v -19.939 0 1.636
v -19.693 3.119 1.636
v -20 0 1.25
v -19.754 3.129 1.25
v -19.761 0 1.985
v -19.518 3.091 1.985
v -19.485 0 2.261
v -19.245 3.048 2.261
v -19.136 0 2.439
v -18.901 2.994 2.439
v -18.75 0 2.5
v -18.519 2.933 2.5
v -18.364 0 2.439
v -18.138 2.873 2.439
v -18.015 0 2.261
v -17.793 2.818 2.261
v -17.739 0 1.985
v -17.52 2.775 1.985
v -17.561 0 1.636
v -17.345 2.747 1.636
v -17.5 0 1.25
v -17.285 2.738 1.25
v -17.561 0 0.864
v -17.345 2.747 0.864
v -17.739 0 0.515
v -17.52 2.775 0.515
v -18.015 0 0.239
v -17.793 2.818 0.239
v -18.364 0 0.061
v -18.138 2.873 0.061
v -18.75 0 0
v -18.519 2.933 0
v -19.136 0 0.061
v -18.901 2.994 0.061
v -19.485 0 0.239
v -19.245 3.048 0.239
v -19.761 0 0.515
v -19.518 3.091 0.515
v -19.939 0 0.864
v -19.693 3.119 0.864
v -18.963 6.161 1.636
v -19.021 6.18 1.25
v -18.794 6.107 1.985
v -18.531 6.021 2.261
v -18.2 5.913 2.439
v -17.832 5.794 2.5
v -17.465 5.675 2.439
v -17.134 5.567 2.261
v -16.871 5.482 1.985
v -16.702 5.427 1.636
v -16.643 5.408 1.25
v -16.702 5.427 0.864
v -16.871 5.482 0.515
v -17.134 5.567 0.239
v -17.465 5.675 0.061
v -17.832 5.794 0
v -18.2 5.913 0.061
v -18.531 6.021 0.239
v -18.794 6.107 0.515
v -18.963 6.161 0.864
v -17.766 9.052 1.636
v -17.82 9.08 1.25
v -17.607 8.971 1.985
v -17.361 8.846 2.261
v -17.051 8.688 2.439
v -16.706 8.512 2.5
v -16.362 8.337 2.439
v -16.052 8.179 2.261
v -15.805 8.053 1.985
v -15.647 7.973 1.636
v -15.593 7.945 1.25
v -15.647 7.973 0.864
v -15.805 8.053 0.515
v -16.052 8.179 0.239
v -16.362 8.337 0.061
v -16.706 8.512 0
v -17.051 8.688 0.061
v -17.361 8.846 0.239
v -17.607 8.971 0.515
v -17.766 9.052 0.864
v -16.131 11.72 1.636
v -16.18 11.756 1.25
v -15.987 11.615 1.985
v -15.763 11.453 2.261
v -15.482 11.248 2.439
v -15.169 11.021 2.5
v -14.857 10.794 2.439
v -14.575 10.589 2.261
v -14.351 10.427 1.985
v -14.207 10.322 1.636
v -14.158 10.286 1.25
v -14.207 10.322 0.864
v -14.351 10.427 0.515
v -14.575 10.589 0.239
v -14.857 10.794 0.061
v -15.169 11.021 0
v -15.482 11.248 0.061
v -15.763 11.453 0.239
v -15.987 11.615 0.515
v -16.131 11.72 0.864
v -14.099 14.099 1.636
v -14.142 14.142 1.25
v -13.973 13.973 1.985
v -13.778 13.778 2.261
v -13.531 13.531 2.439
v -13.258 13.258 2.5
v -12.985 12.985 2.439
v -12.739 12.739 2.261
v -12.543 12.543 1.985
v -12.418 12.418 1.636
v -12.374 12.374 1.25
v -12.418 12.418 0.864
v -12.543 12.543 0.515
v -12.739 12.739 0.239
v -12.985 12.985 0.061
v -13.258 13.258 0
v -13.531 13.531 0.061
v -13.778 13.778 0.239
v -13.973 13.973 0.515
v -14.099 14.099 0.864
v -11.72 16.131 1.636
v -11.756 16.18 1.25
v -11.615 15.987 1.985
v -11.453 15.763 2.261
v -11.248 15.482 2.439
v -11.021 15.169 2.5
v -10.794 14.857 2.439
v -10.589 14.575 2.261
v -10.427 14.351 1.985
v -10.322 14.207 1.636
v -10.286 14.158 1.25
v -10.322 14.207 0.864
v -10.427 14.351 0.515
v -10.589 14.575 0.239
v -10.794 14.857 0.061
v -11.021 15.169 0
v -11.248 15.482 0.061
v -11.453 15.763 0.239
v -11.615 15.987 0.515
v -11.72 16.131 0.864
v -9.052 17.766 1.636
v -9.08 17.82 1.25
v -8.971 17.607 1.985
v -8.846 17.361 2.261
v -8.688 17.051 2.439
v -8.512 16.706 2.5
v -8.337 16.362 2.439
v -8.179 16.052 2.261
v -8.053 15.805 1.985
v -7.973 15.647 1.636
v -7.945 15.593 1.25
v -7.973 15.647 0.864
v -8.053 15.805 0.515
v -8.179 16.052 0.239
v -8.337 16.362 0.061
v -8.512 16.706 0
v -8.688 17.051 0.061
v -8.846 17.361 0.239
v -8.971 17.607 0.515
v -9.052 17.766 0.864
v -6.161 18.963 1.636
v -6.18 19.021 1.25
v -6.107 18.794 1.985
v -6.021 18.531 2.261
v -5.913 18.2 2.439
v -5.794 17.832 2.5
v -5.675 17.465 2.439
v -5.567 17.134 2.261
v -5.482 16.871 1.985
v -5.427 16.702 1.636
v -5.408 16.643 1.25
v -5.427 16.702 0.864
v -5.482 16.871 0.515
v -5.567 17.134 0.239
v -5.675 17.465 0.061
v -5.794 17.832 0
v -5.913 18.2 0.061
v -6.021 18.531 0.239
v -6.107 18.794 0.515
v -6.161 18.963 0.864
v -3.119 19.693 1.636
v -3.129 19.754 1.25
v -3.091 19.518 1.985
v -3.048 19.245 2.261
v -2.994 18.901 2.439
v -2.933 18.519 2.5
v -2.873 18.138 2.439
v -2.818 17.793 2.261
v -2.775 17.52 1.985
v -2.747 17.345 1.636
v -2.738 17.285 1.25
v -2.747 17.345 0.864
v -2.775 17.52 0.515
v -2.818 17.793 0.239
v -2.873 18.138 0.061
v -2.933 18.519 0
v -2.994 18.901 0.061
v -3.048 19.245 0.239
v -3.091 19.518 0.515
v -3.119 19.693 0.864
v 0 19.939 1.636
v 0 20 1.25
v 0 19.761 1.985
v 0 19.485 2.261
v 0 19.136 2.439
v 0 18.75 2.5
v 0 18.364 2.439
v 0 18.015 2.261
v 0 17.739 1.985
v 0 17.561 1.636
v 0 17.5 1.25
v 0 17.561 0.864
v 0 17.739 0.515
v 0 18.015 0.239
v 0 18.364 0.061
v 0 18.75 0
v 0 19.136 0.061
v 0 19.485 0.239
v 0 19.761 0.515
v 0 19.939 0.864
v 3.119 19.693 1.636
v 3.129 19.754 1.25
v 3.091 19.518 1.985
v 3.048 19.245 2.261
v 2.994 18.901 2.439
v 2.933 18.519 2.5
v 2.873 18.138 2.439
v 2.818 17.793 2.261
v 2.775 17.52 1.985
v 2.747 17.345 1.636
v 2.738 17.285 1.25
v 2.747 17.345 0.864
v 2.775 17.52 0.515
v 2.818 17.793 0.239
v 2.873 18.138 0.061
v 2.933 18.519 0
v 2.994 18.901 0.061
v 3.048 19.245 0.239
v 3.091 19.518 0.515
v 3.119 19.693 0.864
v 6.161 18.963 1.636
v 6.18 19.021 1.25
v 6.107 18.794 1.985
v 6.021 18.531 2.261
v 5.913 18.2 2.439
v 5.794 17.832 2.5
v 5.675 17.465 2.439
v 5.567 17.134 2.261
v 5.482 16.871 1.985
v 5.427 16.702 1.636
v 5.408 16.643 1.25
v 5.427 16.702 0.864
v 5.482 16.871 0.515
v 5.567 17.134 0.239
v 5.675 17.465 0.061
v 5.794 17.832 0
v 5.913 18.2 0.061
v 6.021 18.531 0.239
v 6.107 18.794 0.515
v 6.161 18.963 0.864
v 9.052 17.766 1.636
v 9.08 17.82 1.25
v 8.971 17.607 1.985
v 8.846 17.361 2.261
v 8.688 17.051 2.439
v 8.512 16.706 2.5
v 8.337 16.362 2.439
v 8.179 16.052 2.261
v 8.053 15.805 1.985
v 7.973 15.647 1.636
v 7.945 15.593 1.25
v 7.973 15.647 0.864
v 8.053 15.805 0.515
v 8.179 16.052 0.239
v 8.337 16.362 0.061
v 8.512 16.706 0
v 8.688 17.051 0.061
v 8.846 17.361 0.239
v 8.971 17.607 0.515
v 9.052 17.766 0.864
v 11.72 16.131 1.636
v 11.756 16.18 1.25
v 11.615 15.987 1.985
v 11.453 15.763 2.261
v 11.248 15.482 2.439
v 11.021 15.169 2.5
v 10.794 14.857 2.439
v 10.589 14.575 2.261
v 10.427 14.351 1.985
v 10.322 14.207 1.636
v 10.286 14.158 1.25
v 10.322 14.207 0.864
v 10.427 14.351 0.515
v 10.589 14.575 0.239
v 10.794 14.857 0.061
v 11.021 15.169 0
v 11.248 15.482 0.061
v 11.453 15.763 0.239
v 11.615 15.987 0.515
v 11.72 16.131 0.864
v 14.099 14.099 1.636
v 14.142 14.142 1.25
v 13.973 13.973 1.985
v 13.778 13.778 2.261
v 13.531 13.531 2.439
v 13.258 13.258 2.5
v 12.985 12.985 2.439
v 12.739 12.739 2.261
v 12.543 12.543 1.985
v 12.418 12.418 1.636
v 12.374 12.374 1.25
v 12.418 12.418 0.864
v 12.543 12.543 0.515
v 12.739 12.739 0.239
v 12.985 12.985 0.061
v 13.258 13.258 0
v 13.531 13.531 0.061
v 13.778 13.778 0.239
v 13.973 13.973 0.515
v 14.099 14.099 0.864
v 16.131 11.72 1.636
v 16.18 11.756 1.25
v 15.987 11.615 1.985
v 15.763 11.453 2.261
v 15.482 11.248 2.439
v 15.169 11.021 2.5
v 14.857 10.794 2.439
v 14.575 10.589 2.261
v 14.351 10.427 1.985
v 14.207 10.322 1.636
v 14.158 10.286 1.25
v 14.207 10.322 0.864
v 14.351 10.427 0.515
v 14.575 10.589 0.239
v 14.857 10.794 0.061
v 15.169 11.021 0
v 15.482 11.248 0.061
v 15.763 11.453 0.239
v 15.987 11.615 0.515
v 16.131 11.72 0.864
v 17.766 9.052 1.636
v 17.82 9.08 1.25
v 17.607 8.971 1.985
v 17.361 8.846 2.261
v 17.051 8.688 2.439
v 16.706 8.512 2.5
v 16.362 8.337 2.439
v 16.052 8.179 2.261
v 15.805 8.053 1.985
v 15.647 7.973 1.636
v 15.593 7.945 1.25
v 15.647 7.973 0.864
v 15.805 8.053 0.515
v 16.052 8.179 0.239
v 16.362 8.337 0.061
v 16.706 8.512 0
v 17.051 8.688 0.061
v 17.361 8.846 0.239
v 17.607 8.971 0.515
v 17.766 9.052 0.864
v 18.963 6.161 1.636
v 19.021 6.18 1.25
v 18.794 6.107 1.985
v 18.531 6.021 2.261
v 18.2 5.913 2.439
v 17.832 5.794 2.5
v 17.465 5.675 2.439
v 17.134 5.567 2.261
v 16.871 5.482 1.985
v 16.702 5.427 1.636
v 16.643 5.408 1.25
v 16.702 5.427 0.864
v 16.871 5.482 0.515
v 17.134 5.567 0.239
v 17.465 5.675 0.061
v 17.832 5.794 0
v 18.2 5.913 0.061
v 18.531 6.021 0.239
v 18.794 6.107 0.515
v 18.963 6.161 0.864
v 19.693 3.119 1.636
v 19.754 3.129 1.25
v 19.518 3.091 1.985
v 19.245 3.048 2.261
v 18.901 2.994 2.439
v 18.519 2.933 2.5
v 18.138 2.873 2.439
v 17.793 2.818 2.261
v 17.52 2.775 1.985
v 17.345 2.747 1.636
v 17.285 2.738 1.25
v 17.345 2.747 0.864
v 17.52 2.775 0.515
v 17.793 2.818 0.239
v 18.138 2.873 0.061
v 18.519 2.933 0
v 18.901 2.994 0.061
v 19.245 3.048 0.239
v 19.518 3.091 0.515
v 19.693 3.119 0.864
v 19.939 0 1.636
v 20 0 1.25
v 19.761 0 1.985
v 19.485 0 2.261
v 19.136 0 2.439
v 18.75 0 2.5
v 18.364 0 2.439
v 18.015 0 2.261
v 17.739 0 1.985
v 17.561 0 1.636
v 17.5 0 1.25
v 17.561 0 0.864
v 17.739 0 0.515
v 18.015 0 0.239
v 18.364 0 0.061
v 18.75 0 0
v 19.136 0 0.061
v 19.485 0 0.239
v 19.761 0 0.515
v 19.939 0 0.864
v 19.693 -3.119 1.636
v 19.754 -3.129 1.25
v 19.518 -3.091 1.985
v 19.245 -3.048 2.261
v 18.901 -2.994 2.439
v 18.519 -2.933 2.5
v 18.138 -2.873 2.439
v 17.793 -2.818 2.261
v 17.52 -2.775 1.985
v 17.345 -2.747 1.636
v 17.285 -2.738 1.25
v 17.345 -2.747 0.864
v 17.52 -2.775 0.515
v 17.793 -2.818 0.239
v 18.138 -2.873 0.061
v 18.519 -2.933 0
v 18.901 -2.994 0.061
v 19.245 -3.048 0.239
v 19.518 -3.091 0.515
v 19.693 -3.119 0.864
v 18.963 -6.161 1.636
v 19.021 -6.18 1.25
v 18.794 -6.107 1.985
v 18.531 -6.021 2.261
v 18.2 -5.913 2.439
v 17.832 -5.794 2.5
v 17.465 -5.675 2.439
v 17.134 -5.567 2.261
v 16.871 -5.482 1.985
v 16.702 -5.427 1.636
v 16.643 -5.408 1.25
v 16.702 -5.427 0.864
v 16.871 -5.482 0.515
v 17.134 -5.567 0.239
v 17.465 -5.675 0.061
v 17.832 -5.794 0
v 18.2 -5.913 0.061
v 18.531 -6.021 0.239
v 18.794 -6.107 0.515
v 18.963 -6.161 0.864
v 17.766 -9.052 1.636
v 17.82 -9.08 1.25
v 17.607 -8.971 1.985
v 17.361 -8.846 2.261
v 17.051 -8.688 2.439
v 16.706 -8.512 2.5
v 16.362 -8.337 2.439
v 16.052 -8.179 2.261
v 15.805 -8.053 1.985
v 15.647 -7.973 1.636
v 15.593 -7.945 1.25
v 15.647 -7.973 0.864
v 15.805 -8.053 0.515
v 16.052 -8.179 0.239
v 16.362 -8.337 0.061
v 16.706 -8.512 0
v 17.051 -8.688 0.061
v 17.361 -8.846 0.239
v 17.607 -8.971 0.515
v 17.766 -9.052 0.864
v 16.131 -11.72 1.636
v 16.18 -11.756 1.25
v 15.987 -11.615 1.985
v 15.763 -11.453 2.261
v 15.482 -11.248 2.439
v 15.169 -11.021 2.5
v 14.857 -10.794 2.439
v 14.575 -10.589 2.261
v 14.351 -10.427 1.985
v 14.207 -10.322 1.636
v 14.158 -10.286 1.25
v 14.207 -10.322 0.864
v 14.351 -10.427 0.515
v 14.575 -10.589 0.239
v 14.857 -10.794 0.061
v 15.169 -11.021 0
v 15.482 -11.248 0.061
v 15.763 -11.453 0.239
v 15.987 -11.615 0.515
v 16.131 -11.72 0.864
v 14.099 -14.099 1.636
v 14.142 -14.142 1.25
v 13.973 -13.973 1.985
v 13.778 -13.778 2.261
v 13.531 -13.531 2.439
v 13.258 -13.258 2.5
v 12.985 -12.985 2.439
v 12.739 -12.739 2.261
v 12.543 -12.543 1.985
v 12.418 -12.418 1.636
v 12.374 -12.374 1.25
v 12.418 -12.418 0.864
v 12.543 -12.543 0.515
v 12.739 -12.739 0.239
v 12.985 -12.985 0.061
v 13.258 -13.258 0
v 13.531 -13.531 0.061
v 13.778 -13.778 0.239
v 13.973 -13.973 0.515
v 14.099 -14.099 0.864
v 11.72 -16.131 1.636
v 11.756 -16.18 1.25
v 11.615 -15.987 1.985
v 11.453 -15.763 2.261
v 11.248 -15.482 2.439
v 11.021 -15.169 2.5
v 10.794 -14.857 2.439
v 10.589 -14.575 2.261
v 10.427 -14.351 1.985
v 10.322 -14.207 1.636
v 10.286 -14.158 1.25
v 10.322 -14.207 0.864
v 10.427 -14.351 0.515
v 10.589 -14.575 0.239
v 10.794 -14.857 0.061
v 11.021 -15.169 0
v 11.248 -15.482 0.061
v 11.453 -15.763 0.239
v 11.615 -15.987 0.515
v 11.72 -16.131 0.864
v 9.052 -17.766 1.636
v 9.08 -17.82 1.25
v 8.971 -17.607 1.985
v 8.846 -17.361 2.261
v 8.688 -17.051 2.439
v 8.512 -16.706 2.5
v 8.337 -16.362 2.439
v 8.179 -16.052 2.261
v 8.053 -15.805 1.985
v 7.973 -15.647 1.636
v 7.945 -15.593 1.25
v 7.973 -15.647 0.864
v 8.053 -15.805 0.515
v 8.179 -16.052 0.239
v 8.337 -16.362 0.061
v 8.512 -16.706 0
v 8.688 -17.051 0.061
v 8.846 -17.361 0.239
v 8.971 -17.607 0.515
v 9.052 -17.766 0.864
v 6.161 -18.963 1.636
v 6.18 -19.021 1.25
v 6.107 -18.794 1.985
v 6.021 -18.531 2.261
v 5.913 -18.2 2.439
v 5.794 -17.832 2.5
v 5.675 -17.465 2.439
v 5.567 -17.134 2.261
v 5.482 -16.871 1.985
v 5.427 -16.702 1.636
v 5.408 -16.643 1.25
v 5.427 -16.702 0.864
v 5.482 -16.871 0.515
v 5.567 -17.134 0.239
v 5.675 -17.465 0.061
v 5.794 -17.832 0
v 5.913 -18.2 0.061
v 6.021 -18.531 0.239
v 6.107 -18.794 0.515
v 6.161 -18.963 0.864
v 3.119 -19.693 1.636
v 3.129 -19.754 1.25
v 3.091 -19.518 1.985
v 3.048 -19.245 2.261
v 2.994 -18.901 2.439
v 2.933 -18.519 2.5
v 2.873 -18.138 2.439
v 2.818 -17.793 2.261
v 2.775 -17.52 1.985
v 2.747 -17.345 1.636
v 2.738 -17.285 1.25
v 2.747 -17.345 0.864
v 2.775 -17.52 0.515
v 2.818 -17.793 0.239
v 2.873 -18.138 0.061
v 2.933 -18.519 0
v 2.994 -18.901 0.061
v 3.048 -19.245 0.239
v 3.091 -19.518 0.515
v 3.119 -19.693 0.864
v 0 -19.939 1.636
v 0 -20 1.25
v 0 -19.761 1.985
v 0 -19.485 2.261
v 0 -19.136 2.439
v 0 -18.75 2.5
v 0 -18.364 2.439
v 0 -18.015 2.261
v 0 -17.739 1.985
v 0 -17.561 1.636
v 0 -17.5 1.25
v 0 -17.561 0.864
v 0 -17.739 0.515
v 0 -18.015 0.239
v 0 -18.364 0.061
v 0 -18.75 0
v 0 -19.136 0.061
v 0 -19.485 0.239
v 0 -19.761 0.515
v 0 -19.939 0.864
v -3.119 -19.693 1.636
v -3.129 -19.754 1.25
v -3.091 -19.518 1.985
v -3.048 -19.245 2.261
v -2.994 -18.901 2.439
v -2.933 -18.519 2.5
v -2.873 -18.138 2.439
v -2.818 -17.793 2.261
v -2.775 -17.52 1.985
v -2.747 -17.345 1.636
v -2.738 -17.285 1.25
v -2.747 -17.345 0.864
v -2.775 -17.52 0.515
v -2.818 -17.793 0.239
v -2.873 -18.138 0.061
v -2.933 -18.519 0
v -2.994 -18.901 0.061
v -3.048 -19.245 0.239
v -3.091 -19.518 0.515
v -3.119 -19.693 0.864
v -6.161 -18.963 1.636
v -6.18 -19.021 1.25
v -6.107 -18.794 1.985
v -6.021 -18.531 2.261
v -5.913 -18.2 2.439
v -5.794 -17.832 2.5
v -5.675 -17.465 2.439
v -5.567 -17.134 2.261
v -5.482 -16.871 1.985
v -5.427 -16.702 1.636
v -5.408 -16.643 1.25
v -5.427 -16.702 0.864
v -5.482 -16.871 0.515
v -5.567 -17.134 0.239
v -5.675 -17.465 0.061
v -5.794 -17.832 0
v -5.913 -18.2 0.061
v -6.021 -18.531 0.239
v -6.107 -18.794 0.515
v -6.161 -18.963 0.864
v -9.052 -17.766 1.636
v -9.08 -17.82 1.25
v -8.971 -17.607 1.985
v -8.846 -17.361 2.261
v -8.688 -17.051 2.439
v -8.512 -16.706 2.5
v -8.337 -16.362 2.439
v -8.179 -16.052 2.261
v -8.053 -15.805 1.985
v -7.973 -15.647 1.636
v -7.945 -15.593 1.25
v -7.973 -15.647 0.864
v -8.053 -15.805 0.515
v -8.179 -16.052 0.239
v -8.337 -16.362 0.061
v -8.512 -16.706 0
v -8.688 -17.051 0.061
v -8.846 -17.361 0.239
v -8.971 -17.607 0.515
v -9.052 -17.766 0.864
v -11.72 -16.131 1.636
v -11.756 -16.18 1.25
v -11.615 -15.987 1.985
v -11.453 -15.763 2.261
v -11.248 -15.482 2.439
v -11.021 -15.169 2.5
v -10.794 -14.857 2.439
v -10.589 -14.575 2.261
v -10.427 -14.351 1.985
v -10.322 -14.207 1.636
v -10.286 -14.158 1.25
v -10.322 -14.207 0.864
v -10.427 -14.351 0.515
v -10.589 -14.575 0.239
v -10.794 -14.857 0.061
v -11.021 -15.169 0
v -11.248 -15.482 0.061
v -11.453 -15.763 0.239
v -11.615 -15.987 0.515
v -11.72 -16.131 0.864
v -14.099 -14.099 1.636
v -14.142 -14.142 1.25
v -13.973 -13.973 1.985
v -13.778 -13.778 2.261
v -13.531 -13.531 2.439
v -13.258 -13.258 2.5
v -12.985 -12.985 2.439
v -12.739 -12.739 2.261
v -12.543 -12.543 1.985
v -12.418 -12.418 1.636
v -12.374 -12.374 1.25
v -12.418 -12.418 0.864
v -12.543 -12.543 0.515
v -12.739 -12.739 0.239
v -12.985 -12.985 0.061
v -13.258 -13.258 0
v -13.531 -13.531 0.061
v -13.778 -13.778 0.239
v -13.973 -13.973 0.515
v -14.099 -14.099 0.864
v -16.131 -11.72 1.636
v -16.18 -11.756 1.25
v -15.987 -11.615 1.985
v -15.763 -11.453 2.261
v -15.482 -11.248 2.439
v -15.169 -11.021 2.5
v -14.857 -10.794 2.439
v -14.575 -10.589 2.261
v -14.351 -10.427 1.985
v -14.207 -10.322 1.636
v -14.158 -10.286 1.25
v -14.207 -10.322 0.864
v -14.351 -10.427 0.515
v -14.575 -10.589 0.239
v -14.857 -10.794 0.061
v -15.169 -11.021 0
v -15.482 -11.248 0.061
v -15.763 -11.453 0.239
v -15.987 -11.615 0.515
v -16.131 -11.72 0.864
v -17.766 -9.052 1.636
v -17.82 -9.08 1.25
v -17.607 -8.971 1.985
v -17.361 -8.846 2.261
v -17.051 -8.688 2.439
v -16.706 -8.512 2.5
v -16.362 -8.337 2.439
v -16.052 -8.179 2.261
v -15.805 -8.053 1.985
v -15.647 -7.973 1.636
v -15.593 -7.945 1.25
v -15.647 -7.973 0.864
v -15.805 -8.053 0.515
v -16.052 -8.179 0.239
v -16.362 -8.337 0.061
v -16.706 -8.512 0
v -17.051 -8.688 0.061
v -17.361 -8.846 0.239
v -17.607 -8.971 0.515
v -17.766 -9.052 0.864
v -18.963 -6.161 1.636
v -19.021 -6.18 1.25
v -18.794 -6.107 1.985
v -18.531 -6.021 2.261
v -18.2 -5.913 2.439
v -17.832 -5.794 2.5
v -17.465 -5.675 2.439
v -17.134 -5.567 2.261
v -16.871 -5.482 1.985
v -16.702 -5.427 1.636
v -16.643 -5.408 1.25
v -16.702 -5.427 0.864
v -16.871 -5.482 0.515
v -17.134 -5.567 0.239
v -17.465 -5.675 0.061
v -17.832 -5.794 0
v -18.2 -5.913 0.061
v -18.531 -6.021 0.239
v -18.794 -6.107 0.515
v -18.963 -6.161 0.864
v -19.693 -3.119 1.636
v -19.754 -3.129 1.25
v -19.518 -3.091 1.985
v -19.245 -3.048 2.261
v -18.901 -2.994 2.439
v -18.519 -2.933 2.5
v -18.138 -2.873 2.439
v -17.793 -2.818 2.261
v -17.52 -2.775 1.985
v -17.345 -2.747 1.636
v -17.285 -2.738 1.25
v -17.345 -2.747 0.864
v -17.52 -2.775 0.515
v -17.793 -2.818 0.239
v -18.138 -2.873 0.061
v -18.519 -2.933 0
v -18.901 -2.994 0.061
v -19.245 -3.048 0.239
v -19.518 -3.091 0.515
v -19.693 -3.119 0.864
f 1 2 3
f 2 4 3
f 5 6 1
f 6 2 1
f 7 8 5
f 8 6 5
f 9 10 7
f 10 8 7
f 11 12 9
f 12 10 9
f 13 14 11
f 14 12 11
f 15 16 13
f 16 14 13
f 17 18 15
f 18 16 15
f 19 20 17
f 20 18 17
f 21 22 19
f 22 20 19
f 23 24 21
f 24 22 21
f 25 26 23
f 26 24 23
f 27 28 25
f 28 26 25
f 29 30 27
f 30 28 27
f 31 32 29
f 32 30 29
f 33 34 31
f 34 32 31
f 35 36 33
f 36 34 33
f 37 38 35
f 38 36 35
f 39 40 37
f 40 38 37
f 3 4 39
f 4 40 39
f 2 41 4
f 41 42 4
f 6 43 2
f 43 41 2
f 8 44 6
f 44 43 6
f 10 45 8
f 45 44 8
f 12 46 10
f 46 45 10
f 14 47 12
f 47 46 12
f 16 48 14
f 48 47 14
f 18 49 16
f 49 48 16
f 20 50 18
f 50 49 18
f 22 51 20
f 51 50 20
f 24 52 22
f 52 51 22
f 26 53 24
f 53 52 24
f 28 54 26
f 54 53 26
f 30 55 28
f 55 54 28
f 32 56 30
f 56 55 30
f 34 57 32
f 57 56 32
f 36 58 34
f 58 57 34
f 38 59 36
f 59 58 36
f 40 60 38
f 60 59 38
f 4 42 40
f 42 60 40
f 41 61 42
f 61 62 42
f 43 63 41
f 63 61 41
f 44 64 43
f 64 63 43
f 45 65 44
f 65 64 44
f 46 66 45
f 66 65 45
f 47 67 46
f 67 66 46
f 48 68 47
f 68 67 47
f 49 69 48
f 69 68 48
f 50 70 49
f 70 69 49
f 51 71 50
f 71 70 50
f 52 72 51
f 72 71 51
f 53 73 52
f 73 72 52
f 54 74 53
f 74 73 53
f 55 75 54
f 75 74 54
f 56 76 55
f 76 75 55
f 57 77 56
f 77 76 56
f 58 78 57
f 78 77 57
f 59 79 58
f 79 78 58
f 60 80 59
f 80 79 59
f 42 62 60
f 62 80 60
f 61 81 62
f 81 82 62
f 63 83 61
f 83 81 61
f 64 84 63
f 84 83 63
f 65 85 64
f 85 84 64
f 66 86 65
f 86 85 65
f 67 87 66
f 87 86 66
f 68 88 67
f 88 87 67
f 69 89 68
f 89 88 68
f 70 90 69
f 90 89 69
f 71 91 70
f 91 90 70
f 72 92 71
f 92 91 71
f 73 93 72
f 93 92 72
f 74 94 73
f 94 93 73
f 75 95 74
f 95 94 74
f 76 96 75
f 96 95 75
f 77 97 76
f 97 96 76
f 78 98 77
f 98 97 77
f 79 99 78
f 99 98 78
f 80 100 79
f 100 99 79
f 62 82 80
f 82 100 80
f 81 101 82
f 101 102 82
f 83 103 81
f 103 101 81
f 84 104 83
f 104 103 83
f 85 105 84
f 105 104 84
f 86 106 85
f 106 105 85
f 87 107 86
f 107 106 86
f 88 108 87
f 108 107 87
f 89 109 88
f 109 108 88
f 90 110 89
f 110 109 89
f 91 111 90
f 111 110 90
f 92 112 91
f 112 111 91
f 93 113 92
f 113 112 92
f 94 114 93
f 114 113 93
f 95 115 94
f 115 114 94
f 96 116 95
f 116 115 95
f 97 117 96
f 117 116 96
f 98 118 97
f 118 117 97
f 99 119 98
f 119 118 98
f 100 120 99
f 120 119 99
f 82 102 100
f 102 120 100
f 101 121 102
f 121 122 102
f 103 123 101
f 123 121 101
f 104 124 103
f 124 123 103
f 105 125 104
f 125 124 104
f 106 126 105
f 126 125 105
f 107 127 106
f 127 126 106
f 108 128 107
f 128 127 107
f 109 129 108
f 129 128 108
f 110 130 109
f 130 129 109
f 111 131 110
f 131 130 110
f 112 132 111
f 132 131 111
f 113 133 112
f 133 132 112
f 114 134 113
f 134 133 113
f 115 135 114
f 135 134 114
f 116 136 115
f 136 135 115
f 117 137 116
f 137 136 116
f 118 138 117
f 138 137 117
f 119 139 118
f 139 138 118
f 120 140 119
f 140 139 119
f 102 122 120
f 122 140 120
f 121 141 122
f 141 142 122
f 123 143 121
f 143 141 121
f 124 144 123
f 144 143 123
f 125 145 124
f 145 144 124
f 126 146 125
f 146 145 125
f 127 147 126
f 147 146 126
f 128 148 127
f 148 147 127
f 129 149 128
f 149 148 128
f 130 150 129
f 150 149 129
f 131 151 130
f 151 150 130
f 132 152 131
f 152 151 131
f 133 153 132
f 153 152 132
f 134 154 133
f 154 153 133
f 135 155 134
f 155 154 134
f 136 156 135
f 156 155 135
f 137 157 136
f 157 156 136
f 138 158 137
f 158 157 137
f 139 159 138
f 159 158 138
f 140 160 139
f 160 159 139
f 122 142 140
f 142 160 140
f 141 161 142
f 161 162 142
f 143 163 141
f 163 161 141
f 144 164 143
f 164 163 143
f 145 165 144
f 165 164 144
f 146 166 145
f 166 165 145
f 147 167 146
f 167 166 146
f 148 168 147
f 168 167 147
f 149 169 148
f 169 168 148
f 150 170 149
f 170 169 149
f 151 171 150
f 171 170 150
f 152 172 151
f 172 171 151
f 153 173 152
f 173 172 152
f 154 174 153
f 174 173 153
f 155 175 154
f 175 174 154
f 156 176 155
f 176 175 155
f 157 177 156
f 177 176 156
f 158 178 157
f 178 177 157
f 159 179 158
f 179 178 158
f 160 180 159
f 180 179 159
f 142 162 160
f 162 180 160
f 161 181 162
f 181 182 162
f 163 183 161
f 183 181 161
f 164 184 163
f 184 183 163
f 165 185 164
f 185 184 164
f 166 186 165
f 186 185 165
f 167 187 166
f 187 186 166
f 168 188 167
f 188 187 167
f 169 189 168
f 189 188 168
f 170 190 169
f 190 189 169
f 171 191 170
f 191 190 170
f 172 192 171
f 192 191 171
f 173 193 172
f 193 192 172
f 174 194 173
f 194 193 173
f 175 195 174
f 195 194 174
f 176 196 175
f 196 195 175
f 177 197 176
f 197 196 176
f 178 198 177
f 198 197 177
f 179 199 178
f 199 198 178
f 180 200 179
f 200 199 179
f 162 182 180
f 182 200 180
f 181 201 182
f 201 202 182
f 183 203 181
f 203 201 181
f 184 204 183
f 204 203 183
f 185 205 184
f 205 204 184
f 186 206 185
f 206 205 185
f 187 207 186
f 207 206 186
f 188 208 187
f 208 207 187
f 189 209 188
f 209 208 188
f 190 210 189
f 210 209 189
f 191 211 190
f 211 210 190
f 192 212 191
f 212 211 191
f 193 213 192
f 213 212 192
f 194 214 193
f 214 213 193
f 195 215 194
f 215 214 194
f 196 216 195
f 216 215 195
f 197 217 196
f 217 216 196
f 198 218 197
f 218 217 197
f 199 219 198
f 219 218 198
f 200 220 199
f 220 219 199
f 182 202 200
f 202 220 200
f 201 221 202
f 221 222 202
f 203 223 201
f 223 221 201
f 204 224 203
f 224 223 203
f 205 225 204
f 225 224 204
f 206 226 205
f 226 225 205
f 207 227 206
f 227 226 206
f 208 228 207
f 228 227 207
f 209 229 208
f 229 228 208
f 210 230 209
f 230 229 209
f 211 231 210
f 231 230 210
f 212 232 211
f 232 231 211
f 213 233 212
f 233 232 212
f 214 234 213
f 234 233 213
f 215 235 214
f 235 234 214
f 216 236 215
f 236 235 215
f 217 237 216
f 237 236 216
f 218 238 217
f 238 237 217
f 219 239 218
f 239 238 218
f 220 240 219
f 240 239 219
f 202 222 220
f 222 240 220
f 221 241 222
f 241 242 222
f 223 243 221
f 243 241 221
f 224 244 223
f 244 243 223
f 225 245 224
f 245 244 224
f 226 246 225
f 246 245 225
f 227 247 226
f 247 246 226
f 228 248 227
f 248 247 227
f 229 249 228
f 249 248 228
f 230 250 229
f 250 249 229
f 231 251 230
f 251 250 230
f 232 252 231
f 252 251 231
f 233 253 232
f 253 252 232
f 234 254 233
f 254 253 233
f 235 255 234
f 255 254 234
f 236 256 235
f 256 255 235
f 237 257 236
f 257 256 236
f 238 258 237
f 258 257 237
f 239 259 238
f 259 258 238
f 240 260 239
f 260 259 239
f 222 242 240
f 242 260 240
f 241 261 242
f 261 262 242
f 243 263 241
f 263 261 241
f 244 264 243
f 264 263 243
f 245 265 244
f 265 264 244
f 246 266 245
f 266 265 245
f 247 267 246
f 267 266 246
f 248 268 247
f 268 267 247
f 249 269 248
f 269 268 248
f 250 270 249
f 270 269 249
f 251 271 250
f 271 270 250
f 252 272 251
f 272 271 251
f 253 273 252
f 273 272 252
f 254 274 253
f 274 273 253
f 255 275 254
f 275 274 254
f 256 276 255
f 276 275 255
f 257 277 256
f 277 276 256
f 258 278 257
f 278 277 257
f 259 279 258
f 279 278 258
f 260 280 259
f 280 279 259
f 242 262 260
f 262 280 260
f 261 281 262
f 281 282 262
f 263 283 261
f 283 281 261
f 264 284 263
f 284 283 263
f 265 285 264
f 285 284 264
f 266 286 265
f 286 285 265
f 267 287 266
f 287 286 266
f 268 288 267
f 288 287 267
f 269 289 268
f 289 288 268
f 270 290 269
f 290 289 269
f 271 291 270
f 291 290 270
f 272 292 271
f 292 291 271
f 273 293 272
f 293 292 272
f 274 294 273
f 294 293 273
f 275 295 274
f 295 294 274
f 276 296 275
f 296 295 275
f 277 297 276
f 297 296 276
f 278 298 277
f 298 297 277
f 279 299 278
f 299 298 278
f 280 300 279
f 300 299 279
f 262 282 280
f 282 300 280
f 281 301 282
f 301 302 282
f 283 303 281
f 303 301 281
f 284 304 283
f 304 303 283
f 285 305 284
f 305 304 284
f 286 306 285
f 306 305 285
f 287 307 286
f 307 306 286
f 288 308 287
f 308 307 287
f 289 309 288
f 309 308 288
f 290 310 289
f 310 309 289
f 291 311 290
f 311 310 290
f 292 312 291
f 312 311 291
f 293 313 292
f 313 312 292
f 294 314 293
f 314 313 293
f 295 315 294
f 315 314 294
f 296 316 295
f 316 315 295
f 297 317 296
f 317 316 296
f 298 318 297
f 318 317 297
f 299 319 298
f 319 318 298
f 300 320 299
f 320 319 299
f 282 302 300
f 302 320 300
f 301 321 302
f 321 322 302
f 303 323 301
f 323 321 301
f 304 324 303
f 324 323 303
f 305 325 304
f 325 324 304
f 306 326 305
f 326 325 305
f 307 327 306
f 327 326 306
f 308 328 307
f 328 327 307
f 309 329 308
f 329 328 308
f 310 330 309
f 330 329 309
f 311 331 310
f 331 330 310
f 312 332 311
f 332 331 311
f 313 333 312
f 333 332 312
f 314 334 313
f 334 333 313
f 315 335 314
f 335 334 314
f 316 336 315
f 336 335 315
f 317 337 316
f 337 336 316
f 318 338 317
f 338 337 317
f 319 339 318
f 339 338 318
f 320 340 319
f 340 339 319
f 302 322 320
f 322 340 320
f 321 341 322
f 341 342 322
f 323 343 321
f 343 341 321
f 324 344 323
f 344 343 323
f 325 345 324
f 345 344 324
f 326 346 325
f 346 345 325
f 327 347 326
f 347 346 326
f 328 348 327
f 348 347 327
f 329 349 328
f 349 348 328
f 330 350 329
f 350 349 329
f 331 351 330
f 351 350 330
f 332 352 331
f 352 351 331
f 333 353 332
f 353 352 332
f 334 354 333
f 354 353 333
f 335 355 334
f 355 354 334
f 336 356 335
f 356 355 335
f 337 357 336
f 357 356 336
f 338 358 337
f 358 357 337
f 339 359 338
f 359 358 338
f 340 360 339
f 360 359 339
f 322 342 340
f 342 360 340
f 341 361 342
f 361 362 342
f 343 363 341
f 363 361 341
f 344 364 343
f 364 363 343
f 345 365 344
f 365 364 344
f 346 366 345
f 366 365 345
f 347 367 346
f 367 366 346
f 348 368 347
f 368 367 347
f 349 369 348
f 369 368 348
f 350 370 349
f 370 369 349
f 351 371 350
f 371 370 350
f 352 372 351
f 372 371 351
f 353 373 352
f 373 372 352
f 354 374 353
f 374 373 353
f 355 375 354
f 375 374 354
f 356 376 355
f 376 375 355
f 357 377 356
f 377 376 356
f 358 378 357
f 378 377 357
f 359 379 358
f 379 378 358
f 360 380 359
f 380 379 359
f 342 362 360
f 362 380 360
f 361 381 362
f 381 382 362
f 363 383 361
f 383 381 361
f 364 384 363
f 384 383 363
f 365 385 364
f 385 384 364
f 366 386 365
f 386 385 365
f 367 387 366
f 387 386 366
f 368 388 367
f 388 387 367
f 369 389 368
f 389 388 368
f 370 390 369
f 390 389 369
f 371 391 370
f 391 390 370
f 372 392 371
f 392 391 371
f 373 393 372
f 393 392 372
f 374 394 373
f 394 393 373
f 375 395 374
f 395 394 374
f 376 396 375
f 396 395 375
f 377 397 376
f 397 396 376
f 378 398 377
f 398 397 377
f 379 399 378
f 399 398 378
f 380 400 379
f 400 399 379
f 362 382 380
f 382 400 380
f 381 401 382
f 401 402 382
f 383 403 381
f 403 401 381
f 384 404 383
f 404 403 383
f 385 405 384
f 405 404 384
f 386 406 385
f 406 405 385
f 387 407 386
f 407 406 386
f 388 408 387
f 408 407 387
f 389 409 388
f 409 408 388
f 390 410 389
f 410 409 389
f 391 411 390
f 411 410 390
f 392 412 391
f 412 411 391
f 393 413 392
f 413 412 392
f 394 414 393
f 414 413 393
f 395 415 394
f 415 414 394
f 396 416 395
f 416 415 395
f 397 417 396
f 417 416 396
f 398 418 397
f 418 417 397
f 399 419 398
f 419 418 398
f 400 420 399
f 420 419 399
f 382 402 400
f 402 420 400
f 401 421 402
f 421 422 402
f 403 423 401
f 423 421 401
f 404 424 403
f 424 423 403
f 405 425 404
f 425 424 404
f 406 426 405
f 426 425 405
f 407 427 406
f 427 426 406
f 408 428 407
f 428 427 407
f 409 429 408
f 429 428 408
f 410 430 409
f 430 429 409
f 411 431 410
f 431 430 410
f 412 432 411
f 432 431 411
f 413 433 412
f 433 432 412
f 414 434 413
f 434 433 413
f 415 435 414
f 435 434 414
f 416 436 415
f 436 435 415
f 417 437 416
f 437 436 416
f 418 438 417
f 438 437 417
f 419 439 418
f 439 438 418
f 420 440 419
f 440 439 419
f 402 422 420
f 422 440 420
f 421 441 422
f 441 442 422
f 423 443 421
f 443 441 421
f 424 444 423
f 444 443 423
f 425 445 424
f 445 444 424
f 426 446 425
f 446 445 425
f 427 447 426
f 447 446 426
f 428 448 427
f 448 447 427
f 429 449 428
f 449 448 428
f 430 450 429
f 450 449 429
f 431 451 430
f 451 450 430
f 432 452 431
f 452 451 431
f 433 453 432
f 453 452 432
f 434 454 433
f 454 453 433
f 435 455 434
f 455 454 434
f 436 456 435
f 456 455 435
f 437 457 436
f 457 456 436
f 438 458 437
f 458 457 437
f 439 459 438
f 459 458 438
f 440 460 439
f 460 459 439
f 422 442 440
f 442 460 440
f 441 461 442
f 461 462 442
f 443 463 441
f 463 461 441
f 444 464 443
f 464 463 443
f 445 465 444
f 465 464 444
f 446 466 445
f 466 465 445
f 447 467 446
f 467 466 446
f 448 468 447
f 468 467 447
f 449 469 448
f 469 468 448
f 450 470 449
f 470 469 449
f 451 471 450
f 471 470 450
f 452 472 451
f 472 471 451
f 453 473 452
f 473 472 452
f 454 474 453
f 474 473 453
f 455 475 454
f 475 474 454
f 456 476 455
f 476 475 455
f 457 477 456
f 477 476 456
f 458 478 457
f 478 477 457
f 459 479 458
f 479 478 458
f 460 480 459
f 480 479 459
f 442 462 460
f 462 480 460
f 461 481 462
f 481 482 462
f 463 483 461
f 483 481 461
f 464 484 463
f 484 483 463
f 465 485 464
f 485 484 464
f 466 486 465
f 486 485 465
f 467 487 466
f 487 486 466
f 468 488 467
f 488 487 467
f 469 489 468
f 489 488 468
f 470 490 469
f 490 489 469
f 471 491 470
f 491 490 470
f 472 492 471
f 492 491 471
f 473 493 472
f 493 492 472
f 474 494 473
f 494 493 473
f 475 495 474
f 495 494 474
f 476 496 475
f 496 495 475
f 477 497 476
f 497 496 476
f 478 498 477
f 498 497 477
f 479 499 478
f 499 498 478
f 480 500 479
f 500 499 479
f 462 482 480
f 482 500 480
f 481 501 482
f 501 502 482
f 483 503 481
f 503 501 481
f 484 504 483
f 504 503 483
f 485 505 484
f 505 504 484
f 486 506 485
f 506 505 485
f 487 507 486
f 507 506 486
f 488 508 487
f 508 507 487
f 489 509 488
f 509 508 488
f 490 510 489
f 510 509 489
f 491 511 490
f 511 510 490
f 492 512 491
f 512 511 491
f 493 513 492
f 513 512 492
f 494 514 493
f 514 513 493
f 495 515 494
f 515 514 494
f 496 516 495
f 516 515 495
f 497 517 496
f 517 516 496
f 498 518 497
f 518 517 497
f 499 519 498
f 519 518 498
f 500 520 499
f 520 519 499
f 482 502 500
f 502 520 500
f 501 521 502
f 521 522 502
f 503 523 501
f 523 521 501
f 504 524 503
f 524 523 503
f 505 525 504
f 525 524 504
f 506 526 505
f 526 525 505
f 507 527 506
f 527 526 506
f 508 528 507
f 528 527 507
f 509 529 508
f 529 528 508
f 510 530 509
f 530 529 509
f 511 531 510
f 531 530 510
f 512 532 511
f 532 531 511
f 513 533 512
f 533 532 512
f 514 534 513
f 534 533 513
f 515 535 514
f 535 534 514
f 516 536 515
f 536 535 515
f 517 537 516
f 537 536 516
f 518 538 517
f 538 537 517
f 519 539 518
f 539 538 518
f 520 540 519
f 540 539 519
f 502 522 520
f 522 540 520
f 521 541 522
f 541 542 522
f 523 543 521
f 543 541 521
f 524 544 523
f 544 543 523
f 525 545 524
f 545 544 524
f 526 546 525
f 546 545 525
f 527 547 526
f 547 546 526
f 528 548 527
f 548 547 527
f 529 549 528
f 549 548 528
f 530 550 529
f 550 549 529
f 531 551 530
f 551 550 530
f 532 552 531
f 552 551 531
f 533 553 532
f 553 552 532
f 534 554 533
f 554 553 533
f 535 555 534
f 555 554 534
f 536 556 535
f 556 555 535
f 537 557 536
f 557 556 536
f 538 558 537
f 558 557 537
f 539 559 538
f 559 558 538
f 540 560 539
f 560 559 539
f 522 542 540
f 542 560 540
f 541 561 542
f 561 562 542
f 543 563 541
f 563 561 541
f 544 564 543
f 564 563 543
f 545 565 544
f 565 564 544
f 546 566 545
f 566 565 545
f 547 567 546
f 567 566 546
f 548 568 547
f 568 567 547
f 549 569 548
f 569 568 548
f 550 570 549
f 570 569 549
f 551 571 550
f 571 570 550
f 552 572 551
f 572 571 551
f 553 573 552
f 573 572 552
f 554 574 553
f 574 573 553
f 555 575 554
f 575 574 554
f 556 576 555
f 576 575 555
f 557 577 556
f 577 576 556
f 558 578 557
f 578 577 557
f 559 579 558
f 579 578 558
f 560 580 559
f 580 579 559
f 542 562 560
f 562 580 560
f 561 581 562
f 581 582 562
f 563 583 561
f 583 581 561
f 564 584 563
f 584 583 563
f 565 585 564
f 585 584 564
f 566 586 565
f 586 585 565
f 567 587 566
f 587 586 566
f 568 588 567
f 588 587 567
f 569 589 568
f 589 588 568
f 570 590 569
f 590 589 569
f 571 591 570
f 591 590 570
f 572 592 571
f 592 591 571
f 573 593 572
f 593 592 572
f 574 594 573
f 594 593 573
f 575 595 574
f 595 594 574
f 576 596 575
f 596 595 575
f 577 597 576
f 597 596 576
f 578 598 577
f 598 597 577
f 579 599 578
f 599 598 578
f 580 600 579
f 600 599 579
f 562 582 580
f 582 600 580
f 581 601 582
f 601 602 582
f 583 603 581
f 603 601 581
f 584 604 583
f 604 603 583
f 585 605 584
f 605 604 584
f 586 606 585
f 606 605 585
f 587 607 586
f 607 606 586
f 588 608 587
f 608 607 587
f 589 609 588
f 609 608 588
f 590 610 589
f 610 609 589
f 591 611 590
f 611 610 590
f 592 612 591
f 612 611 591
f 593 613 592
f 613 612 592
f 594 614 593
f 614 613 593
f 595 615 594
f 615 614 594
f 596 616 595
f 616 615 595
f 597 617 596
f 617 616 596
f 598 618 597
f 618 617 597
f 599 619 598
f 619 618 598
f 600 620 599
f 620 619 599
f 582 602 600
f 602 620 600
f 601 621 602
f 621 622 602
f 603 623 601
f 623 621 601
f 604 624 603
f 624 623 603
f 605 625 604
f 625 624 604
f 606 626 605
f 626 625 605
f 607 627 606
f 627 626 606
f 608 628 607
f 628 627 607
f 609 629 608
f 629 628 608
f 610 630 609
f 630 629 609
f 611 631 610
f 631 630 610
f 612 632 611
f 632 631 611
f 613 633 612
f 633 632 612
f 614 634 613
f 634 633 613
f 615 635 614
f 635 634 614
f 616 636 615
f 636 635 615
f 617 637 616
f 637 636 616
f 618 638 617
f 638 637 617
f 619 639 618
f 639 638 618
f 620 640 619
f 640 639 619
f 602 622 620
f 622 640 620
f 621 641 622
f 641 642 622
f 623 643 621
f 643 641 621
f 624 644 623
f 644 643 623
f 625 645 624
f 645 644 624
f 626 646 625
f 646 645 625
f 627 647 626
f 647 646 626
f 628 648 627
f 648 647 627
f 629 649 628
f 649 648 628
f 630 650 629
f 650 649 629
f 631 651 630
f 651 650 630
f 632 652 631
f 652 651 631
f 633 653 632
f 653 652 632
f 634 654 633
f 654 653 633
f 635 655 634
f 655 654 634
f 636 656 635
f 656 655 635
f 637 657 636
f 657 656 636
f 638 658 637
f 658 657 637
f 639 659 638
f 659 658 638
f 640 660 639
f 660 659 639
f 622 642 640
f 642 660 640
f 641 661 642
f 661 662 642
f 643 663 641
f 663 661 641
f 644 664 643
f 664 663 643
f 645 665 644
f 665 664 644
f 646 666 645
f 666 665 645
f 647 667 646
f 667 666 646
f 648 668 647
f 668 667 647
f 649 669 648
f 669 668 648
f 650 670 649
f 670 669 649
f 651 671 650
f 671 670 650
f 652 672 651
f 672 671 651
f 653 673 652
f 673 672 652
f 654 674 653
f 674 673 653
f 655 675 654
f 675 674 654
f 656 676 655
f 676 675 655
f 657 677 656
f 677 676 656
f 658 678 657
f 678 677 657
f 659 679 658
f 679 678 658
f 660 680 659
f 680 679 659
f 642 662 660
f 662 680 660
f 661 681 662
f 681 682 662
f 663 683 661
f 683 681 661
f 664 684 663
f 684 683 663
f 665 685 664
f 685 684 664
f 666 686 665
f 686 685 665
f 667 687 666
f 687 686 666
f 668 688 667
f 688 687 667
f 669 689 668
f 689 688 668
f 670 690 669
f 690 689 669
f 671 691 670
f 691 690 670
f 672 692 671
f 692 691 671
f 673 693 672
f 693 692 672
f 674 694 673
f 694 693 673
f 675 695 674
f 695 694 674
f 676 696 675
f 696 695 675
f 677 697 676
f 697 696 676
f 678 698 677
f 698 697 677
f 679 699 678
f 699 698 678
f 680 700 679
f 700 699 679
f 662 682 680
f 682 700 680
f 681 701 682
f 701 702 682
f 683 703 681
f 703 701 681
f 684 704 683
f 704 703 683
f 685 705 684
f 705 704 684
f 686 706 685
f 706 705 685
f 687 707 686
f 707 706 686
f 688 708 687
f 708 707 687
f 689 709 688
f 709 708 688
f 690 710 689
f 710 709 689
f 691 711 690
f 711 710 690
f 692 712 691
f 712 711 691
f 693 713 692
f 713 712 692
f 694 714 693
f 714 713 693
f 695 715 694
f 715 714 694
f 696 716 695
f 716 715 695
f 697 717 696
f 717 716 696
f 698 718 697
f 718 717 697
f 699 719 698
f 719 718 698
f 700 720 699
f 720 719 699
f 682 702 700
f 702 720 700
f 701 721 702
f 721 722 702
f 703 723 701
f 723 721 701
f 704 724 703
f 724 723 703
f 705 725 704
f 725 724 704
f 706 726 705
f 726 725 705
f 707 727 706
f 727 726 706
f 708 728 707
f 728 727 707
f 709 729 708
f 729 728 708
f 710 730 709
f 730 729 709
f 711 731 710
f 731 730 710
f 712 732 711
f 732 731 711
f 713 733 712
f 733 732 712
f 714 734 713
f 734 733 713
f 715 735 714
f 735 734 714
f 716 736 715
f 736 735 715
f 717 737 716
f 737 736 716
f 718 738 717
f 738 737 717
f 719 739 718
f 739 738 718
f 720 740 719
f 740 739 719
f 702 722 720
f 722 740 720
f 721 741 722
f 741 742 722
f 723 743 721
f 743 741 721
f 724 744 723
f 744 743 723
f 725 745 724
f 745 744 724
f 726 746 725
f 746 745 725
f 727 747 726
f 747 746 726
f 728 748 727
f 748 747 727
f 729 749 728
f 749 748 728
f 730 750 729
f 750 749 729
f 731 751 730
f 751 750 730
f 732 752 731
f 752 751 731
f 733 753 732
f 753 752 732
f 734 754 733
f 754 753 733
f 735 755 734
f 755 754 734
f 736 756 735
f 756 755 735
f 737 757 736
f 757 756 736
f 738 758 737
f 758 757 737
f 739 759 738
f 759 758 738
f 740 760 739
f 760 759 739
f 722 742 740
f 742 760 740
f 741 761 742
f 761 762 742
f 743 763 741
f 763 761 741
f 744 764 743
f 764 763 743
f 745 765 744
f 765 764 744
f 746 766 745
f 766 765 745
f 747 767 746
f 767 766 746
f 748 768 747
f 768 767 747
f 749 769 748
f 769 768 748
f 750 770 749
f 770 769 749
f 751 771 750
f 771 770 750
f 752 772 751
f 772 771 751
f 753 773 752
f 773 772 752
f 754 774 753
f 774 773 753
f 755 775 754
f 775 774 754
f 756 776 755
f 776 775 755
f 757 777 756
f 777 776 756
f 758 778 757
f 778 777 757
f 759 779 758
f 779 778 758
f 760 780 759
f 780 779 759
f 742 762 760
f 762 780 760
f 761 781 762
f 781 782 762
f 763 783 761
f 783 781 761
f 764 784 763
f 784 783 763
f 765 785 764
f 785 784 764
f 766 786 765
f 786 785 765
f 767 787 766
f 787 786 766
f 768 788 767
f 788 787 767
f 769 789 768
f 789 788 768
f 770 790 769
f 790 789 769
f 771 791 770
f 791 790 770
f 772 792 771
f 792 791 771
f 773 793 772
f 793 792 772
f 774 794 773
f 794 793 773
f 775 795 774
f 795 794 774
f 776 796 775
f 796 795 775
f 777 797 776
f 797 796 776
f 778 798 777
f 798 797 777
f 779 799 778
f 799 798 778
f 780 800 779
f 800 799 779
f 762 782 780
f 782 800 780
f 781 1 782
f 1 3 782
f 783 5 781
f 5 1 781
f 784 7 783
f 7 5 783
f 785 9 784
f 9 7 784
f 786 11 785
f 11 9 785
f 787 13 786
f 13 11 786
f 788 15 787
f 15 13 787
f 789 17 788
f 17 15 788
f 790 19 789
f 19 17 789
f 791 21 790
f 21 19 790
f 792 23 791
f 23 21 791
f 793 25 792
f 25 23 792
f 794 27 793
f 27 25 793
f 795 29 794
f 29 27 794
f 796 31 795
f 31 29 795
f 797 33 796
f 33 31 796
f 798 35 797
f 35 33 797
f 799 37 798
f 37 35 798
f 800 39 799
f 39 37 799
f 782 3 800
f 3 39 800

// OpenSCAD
// NAME: O Ring 35 x 2.5
// CATEGORY: Wheel
// COLOR: 0

module o_ring_35(){
    rotate_extrude(convexity =1, $fn=40)
        translate([(35+2.5)/2, 0, 0])
        circle(d = 2.5, $fn=20);
}

translate([0, 0, 2.5/2])
    color("black")
    o_ring_35();
